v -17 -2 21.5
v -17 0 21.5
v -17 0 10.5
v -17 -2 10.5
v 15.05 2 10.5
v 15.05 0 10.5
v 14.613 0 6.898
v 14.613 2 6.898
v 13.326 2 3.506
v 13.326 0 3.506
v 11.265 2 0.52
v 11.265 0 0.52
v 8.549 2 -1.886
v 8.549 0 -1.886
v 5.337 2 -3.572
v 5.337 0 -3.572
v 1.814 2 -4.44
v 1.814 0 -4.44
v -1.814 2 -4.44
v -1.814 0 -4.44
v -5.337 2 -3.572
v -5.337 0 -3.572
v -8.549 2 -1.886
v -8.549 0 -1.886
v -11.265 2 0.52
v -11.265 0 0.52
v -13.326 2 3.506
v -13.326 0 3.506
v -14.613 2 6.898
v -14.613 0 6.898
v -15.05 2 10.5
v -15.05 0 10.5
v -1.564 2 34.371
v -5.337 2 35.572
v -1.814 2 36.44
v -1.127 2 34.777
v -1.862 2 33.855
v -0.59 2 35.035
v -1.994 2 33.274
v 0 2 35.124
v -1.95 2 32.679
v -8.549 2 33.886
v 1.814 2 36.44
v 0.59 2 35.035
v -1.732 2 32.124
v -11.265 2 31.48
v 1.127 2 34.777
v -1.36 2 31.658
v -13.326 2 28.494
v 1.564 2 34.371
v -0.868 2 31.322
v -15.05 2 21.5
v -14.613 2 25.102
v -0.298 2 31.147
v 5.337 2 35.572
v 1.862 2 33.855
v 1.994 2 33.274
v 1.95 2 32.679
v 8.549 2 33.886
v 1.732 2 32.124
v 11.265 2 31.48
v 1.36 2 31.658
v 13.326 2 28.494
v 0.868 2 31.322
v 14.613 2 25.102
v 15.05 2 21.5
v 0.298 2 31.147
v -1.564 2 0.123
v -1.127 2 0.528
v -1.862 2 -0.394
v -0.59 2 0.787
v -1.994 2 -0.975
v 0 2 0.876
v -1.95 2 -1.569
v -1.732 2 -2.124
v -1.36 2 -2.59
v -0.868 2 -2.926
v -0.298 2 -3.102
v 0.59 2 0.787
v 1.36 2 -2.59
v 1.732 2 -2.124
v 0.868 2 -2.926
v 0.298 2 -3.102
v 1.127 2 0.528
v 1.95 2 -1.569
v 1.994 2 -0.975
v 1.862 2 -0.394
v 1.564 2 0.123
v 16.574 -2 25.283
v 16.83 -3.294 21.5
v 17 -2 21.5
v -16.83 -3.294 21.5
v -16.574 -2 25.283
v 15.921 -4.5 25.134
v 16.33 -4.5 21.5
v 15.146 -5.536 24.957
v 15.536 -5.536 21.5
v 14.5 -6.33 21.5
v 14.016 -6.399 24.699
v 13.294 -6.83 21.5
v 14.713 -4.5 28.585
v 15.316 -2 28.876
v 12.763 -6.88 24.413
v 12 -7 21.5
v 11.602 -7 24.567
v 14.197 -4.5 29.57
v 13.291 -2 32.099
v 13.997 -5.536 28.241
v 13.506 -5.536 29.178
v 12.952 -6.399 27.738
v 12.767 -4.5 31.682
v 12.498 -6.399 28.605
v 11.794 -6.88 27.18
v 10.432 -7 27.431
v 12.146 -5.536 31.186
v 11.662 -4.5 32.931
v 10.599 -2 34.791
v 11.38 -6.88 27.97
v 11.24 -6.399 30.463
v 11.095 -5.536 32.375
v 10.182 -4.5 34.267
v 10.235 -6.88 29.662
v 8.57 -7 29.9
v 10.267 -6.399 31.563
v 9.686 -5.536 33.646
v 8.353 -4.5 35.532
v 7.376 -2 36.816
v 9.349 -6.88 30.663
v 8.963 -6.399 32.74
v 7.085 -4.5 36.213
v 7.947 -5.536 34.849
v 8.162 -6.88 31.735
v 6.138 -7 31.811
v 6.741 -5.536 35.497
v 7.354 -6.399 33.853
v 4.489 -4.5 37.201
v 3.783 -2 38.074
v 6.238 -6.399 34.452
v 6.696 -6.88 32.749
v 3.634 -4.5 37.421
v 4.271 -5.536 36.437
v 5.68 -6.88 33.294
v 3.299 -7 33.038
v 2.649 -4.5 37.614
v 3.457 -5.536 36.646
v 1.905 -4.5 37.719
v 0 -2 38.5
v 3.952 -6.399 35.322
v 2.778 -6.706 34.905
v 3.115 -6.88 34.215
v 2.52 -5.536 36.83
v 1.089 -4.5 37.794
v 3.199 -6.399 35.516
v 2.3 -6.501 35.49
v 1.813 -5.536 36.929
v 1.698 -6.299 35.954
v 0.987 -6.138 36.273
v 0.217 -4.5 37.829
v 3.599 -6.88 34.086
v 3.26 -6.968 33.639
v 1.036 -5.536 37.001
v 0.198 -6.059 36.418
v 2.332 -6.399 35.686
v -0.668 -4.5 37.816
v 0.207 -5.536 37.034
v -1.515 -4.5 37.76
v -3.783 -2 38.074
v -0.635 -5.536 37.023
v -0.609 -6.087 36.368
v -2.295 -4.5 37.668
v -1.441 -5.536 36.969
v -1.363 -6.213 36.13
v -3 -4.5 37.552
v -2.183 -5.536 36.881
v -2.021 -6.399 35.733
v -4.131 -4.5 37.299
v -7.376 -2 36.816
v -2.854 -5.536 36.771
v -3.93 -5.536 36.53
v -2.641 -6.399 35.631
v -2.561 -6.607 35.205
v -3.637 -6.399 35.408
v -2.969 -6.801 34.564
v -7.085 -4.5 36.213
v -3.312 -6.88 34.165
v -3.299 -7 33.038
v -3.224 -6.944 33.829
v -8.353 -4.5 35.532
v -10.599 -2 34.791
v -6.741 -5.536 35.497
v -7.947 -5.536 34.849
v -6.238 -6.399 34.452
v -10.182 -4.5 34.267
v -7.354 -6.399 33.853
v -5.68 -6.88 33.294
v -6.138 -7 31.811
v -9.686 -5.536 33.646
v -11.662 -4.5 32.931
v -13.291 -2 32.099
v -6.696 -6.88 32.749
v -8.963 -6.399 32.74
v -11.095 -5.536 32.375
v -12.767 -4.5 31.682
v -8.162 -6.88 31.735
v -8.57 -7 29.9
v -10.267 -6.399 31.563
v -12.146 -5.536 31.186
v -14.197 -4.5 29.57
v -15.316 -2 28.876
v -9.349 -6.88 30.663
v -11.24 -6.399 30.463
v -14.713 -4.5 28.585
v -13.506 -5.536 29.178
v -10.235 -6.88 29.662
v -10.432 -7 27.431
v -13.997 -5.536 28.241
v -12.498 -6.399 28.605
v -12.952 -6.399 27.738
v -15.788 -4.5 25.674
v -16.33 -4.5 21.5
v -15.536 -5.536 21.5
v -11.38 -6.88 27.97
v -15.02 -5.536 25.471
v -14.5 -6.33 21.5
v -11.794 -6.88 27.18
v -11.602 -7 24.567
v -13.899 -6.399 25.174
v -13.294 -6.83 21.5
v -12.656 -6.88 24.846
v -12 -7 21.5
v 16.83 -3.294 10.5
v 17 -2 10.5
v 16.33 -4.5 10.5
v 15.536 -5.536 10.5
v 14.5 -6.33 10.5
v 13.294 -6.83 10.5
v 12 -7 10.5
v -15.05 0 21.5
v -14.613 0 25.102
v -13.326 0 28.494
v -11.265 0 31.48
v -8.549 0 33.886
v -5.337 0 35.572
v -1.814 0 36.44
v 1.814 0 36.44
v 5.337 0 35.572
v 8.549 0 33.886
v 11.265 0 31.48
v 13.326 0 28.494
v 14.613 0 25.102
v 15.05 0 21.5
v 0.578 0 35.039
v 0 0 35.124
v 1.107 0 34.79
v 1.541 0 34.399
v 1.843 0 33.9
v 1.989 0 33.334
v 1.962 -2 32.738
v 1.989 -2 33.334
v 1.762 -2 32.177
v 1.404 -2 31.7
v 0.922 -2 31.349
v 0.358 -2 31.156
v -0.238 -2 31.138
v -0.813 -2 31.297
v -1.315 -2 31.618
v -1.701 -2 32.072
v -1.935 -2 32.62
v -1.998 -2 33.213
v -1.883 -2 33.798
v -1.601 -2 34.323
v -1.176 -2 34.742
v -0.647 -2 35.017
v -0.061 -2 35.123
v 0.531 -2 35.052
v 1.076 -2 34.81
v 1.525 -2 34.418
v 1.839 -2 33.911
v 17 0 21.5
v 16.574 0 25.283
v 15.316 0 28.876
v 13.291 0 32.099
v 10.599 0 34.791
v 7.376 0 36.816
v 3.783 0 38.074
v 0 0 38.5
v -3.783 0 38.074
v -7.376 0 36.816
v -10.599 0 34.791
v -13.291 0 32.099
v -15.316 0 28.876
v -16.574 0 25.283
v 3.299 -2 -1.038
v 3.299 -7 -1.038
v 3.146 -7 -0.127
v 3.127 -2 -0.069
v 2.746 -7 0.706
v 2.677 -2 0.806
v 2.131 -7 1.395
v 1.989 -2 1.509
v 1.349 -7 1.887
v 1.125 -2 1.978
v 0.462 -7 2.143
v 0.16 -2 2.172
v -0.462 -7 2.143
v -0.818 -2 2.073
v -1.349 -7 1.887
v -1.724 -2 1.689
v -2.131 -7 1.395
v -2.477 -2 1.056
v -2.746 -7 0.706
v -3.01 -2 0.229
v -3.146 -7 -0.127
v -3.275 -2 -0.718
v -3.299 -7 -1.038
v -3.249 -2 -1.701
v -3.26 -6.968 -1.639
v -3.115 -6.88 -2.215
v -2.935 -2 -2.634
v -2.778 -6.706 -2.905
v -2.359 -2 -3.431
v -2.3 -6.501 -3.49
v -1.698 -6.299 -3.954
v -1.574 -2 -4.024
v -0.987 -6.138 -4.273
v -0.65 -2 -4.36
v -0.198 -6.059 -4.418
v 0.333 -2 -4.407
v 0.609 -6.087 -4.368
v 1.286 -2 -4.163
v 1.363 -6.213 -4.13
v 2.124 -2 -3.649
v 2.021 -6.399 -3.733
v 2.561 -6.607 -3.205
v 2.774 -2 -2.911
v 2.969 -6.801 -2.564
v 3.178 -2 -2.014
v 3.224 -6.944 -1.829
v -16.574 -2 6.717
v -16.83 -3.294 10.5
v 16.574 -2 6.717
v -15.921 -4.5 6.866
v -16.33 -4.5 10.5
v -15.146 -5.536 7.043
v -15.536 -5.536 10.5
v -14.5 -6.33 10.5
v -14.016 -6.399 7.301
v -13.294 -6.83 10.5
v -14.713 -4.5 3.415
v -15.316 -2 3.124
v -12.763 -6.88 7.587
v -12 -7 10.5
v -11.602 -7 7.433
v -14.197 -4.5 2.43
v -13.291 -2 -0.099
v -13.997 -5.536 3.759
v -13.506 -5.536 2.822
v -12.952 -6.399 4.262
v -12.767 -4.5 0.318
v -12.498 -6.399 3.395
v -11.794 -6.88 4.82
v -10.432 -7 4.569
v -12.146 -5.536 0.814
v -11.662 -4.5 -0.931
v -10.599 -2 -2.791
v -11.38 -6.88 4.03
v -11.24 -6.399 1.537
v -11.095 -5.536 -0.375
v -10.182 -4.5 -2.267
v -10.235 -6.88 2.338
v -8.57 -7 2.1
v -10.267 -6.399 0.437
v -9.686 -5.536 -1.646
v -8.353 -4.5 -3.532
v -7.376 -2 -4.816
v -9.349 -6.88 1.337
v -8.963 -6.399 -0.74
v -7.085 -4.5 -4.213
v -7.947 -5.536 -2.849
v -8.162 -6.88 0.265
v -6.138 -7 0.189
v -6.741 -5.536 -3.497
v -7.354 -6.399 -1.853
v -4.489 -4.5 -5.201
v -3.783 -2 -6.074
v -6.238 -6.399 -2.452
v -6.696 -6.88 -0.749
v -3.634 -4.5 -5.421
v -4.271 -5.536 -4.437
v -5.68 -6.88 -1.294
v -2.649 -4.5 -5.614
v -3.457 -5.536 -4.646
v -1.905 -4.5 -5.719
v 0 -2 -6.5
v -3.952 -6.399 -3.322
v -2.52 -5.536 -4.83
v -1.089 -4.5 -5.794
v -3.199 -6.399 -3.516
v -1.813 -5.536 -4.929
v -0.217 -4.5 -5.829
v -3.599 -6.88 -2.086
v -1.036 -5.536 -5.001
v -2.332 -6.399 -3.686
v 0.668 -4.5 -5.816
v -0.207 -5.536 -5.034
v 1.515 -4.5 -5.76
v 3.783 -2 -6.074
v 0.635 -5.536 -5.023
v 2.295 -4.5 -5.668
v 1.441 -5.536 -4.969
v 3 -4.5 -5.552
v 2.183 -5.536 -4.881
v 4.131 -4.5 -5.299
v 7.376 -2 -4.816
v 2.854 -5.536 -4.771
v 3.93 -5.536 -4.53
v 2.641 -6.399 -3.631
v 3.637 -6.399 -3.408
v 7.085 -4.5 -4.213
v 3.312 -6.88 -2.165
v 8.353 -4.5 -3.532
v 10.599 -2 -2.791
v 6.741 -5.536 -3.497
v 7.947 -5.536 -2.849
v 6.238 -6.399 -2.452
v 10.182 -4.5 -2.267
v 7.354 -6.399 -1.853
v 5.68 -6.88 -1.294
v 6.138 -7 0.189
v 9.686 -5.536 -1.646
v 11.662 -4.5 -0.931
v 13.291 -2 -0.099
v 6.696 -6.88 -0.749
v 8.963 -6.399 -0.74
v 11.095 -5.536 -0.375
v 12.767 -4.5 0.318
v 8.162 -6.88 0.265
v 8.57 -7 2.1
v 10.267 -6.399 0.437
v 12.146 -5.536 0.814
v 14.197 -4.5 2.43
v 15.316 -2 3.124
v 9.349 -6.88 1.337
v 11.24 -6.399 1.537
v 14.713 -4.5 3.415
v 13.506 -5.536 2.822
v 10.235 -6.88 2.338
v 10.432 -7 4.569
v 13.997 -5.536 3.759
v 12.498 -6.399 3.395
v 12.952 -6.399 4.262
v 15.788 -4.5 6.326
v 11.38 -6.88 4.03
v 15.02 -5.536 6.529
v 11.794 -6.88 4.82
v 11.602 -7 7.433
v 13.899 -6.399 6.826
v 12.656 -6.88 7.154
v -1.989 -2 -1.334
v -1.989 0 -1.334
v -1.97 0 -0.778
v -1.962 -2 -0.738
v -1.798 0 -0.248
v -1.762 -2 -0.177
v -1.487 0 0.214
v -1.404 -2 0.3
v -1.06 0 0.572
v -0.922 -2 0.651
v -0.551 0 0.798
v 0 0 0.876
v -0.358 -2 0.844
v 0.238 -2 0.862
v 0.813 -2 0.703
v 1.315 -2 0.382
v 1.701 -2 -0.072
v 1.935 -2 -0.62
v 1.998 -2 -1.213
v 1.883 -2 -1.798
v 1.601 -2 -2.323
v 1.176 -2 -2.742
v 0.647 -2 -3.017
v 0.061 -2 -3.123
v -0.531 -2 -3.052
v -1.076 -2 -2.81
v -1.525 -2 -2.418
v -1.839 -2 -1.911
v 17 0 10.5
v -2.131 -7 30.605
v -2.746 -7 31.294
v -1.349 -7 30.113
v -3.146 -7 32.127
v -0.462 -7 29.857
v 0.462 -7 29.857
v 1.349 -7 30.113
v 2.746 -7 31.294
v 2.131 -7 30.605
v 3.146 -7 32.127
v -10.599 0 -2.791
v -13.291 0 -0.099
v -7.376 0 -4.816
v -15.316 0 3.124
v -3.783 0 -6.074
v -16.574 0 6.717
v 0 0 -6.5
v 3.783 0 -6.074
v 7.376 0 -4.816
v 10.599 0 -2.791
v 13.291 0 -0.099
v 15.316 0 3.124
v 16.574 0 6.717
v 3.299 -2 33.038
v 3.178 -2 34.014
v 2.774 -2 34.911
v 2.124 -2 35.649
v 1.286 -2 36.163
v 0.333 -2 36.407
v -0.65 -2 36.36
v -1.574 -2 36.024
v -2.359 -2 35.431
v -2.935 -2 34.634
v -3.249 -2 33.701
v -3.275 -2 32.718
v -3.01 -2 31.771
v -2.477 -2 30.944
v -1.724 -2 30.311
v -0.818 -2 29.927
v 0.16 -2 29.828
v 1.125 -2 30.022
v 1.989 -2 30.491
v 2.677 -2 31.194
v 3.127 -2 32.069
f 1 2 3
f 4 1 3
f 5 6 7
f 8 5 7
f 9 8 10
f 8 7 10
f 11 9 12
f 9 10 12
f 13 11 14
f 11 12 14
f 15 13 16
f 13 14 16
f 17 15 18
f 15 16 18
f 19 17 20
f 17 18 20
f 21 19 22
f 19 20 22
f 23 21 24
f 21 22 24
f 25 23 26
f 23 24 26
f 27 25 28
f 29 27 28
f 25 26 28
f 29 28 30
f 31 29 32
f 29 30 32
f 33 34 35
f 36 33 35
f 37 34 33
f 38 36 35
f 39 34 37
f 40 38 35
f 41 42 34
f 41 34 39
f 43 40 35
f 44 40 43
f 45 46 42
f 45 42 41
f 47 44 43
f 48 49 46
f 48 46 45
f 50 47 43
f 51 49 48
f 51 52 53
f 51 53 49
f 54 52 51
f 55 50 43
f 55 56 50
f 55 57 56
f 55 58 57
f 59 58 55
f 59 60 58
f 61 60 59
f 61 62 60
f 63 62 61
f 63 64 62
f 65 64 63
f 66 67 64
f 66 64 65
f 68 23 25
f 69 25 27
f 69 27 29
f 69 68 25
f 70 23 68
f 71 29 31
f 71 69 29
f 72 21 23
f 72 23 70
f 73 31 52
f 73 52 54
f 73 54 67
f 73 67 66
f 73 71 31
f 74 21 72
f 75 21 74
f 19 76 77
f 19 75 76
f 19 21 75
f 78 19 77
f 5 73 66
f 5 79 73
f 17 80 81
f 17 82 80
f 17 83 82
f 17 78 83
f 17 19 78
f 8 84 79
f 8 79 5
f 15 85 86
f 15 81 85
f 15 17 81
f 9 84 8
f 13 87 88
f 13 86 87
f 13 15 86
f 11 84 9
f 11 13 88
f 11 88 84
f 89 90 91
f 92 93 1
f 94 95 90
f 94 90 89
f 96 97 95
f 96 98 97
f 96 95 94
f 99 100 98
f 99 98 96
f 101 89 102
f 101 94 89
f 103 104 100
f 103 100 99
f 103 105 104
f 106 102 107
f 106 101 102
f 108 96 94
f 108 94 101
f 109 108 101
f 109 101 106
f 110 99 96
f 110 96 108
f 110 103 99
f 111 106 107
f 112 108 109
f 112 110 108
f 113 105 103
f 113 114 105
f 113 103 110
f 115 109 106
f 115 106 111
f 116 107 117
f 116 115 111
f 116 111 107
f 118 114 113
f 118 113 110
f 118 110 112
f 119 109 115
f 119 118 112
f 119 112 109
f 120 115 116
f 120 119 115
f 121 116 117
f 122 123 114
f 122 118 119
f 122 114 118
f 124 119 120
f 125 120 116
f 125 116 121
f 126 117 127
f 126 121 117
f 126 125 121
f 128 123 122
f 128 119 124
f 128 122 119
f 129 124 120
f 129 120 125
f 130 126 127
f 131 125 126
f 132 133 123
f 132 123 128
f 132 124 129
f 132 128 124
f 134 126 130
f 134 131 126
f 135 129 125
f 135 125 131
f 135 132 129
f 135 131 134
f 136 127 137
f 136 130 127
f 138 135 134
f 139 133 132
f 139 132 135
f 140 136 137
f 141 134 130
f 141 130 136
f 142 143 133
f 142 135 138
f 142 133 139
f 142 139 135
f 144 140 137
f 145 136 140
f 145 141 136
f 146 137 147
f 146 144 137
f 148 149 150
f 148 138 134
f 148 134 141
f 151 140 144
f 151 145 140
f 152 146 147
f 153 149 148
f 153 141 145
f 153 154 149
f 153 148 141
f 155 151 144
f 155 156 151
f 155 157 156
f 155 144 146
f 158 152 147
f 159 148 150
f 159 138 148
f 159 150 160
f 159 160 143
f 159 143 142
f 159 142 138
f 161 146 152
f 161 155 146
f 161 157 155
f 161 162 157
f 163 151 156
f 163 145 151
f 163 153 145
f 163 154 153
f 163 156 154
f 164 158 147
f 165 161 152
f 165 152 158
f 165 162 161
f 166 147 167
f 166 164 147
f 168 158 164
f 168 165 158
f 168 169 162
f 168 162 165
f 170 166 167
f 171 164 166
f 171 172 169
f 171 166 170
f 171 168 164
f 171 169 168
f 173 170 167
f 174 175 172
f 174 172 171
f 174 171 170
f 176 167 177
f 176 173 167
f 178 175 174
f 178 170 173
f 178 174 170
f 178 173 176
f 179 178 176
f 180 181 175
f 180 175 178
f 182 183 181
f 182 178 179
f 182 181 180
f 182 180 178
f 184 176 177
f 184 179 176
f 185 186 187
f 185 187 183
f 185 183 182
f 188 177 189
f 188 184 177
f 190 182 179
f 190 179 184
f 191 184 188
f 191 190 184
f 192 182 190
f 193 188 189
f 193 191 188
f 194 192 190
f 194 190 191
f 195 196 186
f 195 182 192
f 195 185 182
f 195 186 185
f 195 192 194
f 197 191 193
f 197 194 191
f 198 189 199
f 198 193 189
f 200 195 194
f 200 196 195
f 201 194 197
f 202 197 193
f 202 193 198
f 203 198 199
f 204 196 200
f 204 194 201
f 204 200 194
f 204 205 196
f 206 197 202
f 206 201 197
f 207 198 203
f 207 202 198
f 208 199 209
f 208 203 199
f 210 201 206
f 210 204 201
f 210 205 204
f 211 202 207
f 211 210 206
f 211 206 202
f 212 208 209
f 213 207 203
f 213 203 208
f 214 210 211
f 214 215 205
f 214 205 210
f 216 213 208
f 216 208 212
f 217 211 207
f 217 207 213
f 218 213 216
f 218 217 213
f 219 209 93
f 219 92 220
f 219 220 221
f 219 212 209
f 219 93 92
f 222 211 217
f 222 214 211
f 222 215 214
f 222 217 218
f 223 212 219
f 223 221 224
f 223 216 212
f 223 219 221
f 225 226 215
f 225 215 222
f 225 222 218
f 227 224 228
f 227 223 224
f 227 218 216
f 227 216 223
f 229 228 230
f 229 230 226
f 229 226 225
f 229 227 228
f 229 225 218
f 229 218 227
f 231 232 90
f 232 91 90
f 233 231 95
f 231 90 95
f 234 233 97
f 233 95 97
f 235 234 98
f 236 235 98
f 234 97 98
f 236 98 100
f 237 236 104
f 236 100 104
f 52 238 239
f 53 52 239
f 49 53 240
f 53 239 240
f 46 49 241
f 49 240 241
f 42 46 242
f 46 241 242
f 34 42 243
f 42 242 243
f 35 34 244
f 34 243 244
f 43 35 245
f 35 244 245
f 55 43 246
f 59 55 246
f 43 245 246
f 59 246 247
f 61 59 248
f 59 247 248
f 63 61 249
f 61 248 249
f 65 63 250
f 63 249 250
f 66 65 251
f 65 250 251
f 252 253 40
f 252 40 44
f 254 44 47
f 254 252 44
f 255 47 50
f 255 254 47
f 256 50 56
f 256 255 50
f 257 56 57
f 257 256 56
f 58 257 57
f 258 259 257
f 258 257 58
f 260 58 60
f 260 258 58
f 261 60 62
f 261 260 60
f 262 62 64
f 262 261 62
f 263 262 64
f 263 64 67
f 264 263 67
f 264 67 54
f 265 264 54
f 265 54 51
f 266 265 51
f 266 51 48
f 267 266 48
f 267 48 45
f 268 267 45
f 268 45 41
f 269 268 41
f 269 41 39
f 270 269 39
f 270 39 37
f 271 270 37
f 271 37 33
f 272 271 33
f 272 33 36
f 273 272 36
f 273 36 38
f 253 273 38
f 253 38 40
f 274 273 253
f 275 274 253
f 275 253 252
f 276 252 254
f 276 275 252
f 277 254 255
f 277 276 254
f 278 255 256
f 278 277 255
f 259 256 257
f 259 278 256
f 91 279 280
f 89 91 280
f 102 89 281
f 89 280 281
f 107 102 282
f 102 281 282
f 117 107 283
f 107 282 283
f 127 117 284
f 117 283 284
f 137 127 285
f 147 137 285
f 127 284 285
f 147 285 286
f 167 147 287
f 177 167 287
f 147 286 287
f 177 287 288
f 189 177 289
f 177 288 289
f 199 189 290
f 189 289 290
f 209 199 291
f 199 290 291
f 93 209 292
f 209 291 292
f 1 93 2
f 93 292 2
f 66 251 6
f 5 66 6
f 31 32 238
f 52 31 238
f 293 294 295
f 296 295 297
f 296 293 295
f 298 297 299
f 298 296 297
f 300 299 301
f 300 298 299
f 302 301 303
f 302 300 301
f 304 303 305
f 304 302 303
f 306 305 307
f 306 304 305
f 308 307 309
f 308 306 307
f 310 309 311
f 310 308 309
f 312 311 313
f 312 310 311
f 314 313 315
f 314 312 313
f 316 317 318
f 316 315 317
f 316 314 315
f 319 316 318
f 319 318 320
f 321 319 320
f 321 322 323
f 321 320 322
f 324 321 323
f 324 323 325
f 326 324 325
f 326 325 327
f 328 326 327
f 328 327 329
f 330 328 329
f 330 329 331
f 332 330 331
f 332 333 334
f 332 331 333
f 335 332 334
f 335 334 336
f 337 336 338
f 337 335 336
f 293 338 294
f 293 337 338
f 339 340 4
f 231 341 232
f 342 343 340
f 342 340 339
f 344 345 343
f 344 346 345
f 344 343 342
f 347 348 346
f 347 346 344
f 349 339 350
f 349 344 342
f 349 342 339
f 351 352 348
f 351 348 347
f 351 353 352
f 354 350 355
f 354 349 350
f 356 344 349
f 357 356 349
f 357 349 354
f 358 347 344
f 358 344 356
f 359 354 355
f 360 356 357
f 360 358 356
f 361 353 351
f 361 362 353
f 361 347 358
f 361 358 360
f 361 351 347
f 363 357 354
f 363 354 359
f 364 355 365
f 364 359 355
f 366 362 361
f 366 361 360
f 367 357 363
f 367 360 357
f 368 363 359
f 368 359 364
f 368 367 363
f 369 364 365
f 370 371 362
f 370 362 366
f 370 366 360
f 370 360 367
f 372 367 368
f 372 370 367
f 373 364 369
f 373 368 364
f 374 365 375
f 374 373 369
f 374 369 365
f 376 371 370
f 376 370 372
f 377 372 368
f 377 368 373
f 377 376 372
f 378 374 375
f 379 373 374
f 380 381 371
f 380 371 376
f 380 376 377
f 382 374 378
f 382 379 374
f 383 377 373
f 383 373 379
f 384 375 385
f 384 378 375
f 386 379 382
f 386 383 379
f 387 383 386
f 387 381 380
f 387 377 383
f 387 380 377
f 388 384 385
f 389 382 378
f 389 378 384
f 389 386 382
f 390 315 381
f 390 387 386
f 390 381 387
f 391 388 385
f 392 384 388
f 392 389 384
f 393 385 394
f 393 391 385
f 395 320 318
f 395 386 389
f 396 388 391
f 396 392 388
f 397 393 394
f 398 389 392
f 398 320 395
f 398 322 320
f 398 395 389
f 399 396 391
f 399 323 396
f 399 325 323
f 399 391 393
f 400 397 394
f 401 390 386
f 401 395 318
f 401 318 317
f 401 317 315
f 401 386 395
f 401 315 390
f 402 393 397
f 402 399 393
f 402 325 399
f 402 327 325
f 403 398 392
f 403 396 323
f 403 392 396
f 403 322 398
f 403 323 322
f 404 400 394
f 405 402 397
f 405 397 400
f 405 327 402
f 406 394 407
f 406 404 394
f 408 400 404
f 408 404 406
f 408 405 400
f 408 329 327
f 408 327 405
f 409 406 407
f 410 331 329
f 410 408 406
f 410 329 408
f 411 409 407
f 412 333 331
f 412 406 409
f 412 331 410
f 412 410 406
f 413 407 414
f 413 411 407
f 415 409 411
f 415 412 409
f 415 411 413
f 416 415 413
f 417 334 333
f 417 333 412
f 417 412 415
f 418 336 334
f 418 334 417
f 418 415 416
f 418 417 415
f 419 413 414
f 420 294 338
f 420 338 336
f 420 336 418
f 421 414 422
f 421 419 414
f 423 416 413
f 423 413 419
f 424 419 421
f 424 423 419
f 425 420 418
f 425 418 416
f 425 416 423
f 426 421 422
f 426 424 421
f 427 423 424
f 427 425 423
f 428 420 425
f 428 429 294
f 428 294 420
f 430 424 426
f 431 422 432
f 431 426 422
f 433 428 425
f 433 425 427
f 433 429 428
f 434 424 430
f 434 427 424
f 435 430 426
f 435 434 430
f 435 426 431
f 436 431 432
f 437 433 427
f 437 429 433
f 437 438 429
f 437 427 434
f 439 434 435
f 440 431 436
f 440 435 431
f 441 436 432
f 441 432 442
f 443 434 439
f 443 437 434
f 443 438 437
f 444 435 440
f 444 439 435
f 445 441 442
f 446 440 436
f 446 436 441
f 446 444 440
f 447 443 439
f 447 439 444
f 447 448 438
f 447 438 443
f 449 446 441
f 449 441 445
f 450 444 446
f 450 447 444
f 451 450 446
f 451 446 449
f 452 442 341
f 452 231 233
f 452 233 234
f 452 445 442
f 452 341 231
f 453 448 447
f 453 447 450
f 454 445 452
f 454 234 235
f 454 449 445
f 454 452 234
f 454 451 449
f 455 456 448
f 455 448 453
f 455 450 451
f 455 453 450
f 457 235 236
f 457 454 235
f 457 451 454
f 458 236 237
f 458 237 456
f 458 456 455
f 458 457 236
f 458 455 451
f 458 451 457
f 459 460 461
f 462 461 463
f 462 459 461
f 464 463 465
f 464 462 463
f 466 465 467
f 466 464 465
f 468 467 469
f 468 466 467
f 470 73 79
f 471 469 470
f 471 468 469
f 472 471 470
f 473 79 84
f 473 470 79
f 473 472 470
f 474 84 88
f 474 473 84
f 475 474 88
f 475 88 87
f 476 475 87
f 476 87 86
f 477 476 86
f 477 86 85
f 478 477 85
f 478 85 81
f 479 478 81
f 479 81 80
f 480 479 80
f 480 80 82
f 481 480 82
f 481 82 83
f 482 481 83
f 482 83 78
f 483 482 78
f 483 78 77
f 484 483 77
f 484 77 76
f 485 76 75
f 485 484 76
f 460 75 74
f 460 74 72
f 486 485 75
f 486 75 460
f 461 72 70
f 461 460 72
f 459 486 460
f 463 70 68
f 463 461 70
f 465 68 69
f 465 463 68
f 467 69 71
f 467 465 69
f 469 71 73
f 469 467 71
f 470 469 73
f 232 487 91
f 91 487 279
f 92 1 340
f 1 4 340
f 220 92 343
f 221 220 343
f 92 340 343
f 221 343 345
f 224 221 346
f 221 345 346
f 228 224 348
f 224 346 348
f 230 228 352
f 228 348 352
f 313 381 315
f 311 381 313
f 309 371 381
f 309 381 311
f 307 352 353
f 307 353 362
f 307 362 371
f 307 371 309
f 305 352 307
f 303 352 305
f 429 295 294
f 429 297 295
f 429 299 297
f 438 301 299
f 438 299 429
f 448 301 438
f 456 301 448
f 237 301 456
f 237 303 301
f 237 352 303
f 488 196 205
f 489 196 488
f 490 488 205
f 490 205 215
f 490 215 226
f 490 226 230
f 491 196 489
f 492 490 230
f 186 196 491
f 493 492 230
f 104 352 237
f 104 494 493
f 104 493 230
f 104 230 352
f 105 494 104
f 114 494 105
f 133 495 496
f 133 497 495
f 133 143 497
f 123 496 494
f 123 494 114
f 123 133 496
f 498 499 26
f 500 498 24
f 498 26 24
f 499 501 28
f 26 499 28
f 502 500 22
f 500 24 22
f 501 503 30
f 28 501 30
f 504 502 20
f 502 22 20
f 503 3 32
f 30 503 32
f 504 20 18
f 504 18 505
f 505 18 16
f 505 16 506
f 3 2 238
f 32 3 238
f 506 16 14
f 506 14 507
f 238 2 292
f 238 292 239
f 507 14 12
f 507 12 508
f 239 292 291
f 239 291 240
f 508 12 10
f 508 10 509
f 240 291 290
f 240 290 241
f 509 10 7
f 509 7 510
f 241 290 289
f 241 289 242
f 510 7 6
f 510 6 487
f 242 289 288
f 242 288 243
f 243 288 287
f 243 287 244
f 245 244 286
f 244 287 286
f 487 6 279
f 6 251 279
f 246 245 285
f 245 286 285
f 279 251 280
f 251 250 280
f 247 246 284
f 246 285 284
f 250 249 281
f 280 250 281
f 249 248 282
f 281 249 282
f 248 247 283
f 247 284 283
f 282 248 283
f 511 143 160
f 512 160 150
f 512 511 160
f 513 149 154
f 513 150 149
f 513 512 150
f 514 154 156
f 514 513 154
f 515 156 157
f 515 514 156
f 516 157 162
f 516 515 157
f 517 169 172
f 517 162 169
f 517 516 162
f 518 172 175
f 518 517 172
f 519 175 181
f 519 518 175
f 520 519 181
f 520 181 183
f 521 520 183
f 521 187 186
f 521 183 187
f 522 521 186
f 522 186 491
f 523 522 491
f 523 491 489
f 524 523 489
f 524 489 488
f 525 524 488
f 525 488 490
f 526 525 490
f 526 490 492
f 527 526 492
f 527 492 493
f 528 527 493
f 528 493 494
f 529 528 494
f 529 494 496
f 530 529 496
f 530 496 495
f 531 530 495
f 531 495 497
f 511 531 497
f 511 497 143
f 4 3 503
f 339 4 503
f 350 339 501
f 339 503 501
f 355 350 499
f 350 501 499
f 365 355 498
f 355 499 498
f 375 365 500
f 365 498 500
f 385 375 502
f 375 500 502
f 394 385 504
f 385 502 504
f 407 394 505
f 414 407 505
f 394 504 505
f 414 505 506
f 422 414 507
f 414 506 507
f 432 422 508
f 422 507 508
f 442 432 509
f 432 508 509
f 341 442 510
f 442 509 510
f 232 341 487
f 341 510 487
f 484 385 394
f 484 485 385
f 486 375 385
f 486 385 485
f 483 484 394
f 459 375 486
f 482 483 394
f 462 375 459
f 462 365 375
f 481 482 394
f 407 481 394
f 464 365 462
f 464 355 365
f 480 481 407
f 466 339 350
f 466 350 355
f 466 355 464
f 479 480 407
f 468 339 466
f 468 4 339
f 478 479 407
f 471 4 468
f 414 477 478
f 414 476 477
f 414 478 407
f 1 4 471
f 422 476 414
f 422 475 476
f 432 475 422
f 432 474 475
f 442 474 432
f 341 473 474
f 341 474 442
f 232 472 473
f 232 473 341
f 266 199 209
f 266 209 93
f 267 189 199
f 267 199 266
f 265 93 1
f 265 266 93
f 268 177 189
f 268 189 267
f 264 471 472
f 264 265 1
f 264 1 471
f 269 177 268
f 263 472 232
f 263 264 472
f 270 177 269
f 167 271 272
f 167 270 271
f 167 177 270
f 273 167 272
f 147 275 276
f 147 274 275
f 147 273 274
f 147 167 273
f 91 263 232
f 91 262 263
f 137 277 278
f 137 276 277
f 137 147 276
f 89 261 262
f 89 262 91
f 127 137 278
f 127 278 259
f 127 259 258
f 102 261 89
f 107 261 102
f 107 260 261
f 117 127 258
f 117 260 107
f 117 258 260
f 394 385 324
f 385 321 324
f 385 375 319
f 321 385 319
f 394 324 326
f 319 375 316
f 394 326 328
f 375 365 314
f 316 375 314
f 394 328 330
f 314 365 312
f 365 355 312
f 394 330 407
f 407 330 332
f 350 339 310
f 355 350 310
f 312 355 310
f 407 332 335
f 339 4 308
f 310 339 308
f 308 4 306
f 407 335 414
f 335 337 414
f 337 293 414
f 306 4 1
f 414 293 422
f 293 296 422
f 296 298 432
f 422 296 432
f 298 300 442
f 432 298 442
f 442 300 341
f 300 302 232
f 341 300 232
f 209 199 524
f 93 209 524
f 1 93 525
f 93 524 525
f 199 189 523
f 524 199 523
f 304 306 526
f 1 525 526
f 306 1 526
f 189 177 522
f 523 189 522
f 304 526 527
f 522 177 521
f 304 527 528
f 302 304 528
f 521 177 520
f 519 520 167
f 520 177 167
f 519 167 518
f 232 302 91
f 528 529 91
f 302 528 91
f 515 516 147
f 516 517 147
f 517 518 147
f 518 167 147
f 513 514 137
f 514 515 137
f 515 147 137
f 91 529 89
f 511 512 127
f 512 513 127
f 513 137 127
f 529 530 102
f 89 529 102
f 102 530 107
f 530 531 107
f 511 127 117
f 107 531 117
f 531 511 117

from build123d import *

# Parameters (mm, degrees)
SKETCH1_R           = 2
BOSS_EXTRUDE1_DEPTH = 2
BOSS_EXTRUDE2_DEPTH = 2
BOSS_EXTRUDE3_DEPTH = 5
FILLET2_R           = 5
CUT_EXTRUDE1_START  = -7
SKETCH4_R           = 2
CUT_EXTRUDE1_DEPTH  = 7
SKETCH5_R           = 3.3
CUT_EXTRUDE2_DEPTH  = 5


with BuildPart() as part:
    # Sketch1 → Boss-Extrude1 (new body)
    with BuildSketch(Plane(origin=(0, 0, 0), x_dir=(1, 0, 0), z_dir=(0, 1, 0))):
        with BuildLine():
            Line((15.05, -21.5), (15.05, -10.5))
            ThreePointArc((15.05, -10.5), (0, 4.549999995), (-15.05, -10.5))
            Line((-15.05, -10.5), (-15.05, -21.5))
            ThreePointArc((-15.05, -21.5), (0, -36.55), (15.05, -21.5))
        make_face()
        with Locations(Location((0, 1.124208827, 0), (0, 0, 270))):
            Circle(SKETCH1_R, mode=Mode.SUBTRACT)
        with Locations(Location((0, -33.124208832, 0), (0, 0, 270))):
            Circle(SKETCH1_R, mode=Mode.SUBTRACT)
    extrude(amount=BOSS_EXTRUDE1_DEPTH)

    # Sketch2 → Boss-Extrude2 (add)
    with BuildSketch(Plane.XZ):
        with BuildLine():
            Line((17, 10.499999999), (17, 21.5))
            ThreePointArc((17, 21.5), (0, 38.5), (-17, 21.5))
            Line((-17, 21.5), (-17, 10.5))
            ThreePointArc((-17, 10.5), (0, -6.499999995), (17, 10.499999999))
        make_face()
    extrude(amount=BOSS_EXTRUDE2_DEPTH)


with BuildPart() as body_2:
    # Sketch3 → Boss-Extrude3 (new body)
    with BuildSketch(Plane.XZ.offset(2)):
        with BuildLine():
            Line((-17, 21.5), (-17, 10.500000005))
            ThreePointArc((-17, 10.500000005), (0, -6.499999995), (17, 10.500000005))
            Line((17, 10.500000005), (17, 21.5))
            ThreePointArc((17, 21.5), (0, 38.5), (-17, 21.5))
        make_face()
    extrude(amount=BOSS_EXTRUDE3_DEPTH)

    # Fillet2
    fillet2_edges = [body_2.edges().sort_by_distance(p)[0] for p in [
        (17, -7, 16.000000003),
        (-17, -7, 16.000000003),
        (0, -7, -6.499999995),
        (0, -7, 38.5),
    ]]
    fillet(fillet2_edges, radius=FILLET2_R - 0.0001)  # a hair under: the kernel refuses the full size


with BuildPart() as cut_extrude1_tool:
    # Sketch4 → Cut-Extrude1 (new body)
    with BuildSketch(Plane(origin=(0, 0, 0), x_dir=(1, 0, 0), z_dir=(0, 1, 0)).offset(CUT_EXTRUDE1_START)):
        with Locations(Location((0, 1.124208827, 0), (0, 0, 173.978283806))):
            Circle(SKETCH4_R)
        with Locations(Location((0, -33.124208832, 0), (0, 0, 353.978283806))):
            Circle(SKETCH4_R)
    extrude(amount=CUT_EXTRUDE1_DEPTH)


with BuildPart() as part_1:
    add(part.part)

    # Cut-Extrude1: cut by cut_extrude1_tool
    add(cut_extrude1_tool.part, mode=Mode.SUBTRACT)


with BuildPart() as body_2_1:
    add(body_2.part)

    # Cut-Extrude1: cut by cut_extrude1_tool
    add(cut_extrude1_tool.part, mode=Mode.SUBTRACT)

    # Sketch5 → Cut-Extrude2 (cut)
    with BuildSketch(Plane.XZ.offset(2)):
        with Locations(Location((0, 33.124208832, 0), (0, 0, 358.49705556))):
            Circle(SKETCH5_R)
        with Locations(Location((0, -1.124208827, 0), (0, 0, 1.50294444))):
            Circle(SKETCH5_R)
    extrude(amount=CUT_EXTRUDE2_DEPTH, mode=Mode.SUBTRACT)


solid = Compound([part_1.part, body_2_1.part])
